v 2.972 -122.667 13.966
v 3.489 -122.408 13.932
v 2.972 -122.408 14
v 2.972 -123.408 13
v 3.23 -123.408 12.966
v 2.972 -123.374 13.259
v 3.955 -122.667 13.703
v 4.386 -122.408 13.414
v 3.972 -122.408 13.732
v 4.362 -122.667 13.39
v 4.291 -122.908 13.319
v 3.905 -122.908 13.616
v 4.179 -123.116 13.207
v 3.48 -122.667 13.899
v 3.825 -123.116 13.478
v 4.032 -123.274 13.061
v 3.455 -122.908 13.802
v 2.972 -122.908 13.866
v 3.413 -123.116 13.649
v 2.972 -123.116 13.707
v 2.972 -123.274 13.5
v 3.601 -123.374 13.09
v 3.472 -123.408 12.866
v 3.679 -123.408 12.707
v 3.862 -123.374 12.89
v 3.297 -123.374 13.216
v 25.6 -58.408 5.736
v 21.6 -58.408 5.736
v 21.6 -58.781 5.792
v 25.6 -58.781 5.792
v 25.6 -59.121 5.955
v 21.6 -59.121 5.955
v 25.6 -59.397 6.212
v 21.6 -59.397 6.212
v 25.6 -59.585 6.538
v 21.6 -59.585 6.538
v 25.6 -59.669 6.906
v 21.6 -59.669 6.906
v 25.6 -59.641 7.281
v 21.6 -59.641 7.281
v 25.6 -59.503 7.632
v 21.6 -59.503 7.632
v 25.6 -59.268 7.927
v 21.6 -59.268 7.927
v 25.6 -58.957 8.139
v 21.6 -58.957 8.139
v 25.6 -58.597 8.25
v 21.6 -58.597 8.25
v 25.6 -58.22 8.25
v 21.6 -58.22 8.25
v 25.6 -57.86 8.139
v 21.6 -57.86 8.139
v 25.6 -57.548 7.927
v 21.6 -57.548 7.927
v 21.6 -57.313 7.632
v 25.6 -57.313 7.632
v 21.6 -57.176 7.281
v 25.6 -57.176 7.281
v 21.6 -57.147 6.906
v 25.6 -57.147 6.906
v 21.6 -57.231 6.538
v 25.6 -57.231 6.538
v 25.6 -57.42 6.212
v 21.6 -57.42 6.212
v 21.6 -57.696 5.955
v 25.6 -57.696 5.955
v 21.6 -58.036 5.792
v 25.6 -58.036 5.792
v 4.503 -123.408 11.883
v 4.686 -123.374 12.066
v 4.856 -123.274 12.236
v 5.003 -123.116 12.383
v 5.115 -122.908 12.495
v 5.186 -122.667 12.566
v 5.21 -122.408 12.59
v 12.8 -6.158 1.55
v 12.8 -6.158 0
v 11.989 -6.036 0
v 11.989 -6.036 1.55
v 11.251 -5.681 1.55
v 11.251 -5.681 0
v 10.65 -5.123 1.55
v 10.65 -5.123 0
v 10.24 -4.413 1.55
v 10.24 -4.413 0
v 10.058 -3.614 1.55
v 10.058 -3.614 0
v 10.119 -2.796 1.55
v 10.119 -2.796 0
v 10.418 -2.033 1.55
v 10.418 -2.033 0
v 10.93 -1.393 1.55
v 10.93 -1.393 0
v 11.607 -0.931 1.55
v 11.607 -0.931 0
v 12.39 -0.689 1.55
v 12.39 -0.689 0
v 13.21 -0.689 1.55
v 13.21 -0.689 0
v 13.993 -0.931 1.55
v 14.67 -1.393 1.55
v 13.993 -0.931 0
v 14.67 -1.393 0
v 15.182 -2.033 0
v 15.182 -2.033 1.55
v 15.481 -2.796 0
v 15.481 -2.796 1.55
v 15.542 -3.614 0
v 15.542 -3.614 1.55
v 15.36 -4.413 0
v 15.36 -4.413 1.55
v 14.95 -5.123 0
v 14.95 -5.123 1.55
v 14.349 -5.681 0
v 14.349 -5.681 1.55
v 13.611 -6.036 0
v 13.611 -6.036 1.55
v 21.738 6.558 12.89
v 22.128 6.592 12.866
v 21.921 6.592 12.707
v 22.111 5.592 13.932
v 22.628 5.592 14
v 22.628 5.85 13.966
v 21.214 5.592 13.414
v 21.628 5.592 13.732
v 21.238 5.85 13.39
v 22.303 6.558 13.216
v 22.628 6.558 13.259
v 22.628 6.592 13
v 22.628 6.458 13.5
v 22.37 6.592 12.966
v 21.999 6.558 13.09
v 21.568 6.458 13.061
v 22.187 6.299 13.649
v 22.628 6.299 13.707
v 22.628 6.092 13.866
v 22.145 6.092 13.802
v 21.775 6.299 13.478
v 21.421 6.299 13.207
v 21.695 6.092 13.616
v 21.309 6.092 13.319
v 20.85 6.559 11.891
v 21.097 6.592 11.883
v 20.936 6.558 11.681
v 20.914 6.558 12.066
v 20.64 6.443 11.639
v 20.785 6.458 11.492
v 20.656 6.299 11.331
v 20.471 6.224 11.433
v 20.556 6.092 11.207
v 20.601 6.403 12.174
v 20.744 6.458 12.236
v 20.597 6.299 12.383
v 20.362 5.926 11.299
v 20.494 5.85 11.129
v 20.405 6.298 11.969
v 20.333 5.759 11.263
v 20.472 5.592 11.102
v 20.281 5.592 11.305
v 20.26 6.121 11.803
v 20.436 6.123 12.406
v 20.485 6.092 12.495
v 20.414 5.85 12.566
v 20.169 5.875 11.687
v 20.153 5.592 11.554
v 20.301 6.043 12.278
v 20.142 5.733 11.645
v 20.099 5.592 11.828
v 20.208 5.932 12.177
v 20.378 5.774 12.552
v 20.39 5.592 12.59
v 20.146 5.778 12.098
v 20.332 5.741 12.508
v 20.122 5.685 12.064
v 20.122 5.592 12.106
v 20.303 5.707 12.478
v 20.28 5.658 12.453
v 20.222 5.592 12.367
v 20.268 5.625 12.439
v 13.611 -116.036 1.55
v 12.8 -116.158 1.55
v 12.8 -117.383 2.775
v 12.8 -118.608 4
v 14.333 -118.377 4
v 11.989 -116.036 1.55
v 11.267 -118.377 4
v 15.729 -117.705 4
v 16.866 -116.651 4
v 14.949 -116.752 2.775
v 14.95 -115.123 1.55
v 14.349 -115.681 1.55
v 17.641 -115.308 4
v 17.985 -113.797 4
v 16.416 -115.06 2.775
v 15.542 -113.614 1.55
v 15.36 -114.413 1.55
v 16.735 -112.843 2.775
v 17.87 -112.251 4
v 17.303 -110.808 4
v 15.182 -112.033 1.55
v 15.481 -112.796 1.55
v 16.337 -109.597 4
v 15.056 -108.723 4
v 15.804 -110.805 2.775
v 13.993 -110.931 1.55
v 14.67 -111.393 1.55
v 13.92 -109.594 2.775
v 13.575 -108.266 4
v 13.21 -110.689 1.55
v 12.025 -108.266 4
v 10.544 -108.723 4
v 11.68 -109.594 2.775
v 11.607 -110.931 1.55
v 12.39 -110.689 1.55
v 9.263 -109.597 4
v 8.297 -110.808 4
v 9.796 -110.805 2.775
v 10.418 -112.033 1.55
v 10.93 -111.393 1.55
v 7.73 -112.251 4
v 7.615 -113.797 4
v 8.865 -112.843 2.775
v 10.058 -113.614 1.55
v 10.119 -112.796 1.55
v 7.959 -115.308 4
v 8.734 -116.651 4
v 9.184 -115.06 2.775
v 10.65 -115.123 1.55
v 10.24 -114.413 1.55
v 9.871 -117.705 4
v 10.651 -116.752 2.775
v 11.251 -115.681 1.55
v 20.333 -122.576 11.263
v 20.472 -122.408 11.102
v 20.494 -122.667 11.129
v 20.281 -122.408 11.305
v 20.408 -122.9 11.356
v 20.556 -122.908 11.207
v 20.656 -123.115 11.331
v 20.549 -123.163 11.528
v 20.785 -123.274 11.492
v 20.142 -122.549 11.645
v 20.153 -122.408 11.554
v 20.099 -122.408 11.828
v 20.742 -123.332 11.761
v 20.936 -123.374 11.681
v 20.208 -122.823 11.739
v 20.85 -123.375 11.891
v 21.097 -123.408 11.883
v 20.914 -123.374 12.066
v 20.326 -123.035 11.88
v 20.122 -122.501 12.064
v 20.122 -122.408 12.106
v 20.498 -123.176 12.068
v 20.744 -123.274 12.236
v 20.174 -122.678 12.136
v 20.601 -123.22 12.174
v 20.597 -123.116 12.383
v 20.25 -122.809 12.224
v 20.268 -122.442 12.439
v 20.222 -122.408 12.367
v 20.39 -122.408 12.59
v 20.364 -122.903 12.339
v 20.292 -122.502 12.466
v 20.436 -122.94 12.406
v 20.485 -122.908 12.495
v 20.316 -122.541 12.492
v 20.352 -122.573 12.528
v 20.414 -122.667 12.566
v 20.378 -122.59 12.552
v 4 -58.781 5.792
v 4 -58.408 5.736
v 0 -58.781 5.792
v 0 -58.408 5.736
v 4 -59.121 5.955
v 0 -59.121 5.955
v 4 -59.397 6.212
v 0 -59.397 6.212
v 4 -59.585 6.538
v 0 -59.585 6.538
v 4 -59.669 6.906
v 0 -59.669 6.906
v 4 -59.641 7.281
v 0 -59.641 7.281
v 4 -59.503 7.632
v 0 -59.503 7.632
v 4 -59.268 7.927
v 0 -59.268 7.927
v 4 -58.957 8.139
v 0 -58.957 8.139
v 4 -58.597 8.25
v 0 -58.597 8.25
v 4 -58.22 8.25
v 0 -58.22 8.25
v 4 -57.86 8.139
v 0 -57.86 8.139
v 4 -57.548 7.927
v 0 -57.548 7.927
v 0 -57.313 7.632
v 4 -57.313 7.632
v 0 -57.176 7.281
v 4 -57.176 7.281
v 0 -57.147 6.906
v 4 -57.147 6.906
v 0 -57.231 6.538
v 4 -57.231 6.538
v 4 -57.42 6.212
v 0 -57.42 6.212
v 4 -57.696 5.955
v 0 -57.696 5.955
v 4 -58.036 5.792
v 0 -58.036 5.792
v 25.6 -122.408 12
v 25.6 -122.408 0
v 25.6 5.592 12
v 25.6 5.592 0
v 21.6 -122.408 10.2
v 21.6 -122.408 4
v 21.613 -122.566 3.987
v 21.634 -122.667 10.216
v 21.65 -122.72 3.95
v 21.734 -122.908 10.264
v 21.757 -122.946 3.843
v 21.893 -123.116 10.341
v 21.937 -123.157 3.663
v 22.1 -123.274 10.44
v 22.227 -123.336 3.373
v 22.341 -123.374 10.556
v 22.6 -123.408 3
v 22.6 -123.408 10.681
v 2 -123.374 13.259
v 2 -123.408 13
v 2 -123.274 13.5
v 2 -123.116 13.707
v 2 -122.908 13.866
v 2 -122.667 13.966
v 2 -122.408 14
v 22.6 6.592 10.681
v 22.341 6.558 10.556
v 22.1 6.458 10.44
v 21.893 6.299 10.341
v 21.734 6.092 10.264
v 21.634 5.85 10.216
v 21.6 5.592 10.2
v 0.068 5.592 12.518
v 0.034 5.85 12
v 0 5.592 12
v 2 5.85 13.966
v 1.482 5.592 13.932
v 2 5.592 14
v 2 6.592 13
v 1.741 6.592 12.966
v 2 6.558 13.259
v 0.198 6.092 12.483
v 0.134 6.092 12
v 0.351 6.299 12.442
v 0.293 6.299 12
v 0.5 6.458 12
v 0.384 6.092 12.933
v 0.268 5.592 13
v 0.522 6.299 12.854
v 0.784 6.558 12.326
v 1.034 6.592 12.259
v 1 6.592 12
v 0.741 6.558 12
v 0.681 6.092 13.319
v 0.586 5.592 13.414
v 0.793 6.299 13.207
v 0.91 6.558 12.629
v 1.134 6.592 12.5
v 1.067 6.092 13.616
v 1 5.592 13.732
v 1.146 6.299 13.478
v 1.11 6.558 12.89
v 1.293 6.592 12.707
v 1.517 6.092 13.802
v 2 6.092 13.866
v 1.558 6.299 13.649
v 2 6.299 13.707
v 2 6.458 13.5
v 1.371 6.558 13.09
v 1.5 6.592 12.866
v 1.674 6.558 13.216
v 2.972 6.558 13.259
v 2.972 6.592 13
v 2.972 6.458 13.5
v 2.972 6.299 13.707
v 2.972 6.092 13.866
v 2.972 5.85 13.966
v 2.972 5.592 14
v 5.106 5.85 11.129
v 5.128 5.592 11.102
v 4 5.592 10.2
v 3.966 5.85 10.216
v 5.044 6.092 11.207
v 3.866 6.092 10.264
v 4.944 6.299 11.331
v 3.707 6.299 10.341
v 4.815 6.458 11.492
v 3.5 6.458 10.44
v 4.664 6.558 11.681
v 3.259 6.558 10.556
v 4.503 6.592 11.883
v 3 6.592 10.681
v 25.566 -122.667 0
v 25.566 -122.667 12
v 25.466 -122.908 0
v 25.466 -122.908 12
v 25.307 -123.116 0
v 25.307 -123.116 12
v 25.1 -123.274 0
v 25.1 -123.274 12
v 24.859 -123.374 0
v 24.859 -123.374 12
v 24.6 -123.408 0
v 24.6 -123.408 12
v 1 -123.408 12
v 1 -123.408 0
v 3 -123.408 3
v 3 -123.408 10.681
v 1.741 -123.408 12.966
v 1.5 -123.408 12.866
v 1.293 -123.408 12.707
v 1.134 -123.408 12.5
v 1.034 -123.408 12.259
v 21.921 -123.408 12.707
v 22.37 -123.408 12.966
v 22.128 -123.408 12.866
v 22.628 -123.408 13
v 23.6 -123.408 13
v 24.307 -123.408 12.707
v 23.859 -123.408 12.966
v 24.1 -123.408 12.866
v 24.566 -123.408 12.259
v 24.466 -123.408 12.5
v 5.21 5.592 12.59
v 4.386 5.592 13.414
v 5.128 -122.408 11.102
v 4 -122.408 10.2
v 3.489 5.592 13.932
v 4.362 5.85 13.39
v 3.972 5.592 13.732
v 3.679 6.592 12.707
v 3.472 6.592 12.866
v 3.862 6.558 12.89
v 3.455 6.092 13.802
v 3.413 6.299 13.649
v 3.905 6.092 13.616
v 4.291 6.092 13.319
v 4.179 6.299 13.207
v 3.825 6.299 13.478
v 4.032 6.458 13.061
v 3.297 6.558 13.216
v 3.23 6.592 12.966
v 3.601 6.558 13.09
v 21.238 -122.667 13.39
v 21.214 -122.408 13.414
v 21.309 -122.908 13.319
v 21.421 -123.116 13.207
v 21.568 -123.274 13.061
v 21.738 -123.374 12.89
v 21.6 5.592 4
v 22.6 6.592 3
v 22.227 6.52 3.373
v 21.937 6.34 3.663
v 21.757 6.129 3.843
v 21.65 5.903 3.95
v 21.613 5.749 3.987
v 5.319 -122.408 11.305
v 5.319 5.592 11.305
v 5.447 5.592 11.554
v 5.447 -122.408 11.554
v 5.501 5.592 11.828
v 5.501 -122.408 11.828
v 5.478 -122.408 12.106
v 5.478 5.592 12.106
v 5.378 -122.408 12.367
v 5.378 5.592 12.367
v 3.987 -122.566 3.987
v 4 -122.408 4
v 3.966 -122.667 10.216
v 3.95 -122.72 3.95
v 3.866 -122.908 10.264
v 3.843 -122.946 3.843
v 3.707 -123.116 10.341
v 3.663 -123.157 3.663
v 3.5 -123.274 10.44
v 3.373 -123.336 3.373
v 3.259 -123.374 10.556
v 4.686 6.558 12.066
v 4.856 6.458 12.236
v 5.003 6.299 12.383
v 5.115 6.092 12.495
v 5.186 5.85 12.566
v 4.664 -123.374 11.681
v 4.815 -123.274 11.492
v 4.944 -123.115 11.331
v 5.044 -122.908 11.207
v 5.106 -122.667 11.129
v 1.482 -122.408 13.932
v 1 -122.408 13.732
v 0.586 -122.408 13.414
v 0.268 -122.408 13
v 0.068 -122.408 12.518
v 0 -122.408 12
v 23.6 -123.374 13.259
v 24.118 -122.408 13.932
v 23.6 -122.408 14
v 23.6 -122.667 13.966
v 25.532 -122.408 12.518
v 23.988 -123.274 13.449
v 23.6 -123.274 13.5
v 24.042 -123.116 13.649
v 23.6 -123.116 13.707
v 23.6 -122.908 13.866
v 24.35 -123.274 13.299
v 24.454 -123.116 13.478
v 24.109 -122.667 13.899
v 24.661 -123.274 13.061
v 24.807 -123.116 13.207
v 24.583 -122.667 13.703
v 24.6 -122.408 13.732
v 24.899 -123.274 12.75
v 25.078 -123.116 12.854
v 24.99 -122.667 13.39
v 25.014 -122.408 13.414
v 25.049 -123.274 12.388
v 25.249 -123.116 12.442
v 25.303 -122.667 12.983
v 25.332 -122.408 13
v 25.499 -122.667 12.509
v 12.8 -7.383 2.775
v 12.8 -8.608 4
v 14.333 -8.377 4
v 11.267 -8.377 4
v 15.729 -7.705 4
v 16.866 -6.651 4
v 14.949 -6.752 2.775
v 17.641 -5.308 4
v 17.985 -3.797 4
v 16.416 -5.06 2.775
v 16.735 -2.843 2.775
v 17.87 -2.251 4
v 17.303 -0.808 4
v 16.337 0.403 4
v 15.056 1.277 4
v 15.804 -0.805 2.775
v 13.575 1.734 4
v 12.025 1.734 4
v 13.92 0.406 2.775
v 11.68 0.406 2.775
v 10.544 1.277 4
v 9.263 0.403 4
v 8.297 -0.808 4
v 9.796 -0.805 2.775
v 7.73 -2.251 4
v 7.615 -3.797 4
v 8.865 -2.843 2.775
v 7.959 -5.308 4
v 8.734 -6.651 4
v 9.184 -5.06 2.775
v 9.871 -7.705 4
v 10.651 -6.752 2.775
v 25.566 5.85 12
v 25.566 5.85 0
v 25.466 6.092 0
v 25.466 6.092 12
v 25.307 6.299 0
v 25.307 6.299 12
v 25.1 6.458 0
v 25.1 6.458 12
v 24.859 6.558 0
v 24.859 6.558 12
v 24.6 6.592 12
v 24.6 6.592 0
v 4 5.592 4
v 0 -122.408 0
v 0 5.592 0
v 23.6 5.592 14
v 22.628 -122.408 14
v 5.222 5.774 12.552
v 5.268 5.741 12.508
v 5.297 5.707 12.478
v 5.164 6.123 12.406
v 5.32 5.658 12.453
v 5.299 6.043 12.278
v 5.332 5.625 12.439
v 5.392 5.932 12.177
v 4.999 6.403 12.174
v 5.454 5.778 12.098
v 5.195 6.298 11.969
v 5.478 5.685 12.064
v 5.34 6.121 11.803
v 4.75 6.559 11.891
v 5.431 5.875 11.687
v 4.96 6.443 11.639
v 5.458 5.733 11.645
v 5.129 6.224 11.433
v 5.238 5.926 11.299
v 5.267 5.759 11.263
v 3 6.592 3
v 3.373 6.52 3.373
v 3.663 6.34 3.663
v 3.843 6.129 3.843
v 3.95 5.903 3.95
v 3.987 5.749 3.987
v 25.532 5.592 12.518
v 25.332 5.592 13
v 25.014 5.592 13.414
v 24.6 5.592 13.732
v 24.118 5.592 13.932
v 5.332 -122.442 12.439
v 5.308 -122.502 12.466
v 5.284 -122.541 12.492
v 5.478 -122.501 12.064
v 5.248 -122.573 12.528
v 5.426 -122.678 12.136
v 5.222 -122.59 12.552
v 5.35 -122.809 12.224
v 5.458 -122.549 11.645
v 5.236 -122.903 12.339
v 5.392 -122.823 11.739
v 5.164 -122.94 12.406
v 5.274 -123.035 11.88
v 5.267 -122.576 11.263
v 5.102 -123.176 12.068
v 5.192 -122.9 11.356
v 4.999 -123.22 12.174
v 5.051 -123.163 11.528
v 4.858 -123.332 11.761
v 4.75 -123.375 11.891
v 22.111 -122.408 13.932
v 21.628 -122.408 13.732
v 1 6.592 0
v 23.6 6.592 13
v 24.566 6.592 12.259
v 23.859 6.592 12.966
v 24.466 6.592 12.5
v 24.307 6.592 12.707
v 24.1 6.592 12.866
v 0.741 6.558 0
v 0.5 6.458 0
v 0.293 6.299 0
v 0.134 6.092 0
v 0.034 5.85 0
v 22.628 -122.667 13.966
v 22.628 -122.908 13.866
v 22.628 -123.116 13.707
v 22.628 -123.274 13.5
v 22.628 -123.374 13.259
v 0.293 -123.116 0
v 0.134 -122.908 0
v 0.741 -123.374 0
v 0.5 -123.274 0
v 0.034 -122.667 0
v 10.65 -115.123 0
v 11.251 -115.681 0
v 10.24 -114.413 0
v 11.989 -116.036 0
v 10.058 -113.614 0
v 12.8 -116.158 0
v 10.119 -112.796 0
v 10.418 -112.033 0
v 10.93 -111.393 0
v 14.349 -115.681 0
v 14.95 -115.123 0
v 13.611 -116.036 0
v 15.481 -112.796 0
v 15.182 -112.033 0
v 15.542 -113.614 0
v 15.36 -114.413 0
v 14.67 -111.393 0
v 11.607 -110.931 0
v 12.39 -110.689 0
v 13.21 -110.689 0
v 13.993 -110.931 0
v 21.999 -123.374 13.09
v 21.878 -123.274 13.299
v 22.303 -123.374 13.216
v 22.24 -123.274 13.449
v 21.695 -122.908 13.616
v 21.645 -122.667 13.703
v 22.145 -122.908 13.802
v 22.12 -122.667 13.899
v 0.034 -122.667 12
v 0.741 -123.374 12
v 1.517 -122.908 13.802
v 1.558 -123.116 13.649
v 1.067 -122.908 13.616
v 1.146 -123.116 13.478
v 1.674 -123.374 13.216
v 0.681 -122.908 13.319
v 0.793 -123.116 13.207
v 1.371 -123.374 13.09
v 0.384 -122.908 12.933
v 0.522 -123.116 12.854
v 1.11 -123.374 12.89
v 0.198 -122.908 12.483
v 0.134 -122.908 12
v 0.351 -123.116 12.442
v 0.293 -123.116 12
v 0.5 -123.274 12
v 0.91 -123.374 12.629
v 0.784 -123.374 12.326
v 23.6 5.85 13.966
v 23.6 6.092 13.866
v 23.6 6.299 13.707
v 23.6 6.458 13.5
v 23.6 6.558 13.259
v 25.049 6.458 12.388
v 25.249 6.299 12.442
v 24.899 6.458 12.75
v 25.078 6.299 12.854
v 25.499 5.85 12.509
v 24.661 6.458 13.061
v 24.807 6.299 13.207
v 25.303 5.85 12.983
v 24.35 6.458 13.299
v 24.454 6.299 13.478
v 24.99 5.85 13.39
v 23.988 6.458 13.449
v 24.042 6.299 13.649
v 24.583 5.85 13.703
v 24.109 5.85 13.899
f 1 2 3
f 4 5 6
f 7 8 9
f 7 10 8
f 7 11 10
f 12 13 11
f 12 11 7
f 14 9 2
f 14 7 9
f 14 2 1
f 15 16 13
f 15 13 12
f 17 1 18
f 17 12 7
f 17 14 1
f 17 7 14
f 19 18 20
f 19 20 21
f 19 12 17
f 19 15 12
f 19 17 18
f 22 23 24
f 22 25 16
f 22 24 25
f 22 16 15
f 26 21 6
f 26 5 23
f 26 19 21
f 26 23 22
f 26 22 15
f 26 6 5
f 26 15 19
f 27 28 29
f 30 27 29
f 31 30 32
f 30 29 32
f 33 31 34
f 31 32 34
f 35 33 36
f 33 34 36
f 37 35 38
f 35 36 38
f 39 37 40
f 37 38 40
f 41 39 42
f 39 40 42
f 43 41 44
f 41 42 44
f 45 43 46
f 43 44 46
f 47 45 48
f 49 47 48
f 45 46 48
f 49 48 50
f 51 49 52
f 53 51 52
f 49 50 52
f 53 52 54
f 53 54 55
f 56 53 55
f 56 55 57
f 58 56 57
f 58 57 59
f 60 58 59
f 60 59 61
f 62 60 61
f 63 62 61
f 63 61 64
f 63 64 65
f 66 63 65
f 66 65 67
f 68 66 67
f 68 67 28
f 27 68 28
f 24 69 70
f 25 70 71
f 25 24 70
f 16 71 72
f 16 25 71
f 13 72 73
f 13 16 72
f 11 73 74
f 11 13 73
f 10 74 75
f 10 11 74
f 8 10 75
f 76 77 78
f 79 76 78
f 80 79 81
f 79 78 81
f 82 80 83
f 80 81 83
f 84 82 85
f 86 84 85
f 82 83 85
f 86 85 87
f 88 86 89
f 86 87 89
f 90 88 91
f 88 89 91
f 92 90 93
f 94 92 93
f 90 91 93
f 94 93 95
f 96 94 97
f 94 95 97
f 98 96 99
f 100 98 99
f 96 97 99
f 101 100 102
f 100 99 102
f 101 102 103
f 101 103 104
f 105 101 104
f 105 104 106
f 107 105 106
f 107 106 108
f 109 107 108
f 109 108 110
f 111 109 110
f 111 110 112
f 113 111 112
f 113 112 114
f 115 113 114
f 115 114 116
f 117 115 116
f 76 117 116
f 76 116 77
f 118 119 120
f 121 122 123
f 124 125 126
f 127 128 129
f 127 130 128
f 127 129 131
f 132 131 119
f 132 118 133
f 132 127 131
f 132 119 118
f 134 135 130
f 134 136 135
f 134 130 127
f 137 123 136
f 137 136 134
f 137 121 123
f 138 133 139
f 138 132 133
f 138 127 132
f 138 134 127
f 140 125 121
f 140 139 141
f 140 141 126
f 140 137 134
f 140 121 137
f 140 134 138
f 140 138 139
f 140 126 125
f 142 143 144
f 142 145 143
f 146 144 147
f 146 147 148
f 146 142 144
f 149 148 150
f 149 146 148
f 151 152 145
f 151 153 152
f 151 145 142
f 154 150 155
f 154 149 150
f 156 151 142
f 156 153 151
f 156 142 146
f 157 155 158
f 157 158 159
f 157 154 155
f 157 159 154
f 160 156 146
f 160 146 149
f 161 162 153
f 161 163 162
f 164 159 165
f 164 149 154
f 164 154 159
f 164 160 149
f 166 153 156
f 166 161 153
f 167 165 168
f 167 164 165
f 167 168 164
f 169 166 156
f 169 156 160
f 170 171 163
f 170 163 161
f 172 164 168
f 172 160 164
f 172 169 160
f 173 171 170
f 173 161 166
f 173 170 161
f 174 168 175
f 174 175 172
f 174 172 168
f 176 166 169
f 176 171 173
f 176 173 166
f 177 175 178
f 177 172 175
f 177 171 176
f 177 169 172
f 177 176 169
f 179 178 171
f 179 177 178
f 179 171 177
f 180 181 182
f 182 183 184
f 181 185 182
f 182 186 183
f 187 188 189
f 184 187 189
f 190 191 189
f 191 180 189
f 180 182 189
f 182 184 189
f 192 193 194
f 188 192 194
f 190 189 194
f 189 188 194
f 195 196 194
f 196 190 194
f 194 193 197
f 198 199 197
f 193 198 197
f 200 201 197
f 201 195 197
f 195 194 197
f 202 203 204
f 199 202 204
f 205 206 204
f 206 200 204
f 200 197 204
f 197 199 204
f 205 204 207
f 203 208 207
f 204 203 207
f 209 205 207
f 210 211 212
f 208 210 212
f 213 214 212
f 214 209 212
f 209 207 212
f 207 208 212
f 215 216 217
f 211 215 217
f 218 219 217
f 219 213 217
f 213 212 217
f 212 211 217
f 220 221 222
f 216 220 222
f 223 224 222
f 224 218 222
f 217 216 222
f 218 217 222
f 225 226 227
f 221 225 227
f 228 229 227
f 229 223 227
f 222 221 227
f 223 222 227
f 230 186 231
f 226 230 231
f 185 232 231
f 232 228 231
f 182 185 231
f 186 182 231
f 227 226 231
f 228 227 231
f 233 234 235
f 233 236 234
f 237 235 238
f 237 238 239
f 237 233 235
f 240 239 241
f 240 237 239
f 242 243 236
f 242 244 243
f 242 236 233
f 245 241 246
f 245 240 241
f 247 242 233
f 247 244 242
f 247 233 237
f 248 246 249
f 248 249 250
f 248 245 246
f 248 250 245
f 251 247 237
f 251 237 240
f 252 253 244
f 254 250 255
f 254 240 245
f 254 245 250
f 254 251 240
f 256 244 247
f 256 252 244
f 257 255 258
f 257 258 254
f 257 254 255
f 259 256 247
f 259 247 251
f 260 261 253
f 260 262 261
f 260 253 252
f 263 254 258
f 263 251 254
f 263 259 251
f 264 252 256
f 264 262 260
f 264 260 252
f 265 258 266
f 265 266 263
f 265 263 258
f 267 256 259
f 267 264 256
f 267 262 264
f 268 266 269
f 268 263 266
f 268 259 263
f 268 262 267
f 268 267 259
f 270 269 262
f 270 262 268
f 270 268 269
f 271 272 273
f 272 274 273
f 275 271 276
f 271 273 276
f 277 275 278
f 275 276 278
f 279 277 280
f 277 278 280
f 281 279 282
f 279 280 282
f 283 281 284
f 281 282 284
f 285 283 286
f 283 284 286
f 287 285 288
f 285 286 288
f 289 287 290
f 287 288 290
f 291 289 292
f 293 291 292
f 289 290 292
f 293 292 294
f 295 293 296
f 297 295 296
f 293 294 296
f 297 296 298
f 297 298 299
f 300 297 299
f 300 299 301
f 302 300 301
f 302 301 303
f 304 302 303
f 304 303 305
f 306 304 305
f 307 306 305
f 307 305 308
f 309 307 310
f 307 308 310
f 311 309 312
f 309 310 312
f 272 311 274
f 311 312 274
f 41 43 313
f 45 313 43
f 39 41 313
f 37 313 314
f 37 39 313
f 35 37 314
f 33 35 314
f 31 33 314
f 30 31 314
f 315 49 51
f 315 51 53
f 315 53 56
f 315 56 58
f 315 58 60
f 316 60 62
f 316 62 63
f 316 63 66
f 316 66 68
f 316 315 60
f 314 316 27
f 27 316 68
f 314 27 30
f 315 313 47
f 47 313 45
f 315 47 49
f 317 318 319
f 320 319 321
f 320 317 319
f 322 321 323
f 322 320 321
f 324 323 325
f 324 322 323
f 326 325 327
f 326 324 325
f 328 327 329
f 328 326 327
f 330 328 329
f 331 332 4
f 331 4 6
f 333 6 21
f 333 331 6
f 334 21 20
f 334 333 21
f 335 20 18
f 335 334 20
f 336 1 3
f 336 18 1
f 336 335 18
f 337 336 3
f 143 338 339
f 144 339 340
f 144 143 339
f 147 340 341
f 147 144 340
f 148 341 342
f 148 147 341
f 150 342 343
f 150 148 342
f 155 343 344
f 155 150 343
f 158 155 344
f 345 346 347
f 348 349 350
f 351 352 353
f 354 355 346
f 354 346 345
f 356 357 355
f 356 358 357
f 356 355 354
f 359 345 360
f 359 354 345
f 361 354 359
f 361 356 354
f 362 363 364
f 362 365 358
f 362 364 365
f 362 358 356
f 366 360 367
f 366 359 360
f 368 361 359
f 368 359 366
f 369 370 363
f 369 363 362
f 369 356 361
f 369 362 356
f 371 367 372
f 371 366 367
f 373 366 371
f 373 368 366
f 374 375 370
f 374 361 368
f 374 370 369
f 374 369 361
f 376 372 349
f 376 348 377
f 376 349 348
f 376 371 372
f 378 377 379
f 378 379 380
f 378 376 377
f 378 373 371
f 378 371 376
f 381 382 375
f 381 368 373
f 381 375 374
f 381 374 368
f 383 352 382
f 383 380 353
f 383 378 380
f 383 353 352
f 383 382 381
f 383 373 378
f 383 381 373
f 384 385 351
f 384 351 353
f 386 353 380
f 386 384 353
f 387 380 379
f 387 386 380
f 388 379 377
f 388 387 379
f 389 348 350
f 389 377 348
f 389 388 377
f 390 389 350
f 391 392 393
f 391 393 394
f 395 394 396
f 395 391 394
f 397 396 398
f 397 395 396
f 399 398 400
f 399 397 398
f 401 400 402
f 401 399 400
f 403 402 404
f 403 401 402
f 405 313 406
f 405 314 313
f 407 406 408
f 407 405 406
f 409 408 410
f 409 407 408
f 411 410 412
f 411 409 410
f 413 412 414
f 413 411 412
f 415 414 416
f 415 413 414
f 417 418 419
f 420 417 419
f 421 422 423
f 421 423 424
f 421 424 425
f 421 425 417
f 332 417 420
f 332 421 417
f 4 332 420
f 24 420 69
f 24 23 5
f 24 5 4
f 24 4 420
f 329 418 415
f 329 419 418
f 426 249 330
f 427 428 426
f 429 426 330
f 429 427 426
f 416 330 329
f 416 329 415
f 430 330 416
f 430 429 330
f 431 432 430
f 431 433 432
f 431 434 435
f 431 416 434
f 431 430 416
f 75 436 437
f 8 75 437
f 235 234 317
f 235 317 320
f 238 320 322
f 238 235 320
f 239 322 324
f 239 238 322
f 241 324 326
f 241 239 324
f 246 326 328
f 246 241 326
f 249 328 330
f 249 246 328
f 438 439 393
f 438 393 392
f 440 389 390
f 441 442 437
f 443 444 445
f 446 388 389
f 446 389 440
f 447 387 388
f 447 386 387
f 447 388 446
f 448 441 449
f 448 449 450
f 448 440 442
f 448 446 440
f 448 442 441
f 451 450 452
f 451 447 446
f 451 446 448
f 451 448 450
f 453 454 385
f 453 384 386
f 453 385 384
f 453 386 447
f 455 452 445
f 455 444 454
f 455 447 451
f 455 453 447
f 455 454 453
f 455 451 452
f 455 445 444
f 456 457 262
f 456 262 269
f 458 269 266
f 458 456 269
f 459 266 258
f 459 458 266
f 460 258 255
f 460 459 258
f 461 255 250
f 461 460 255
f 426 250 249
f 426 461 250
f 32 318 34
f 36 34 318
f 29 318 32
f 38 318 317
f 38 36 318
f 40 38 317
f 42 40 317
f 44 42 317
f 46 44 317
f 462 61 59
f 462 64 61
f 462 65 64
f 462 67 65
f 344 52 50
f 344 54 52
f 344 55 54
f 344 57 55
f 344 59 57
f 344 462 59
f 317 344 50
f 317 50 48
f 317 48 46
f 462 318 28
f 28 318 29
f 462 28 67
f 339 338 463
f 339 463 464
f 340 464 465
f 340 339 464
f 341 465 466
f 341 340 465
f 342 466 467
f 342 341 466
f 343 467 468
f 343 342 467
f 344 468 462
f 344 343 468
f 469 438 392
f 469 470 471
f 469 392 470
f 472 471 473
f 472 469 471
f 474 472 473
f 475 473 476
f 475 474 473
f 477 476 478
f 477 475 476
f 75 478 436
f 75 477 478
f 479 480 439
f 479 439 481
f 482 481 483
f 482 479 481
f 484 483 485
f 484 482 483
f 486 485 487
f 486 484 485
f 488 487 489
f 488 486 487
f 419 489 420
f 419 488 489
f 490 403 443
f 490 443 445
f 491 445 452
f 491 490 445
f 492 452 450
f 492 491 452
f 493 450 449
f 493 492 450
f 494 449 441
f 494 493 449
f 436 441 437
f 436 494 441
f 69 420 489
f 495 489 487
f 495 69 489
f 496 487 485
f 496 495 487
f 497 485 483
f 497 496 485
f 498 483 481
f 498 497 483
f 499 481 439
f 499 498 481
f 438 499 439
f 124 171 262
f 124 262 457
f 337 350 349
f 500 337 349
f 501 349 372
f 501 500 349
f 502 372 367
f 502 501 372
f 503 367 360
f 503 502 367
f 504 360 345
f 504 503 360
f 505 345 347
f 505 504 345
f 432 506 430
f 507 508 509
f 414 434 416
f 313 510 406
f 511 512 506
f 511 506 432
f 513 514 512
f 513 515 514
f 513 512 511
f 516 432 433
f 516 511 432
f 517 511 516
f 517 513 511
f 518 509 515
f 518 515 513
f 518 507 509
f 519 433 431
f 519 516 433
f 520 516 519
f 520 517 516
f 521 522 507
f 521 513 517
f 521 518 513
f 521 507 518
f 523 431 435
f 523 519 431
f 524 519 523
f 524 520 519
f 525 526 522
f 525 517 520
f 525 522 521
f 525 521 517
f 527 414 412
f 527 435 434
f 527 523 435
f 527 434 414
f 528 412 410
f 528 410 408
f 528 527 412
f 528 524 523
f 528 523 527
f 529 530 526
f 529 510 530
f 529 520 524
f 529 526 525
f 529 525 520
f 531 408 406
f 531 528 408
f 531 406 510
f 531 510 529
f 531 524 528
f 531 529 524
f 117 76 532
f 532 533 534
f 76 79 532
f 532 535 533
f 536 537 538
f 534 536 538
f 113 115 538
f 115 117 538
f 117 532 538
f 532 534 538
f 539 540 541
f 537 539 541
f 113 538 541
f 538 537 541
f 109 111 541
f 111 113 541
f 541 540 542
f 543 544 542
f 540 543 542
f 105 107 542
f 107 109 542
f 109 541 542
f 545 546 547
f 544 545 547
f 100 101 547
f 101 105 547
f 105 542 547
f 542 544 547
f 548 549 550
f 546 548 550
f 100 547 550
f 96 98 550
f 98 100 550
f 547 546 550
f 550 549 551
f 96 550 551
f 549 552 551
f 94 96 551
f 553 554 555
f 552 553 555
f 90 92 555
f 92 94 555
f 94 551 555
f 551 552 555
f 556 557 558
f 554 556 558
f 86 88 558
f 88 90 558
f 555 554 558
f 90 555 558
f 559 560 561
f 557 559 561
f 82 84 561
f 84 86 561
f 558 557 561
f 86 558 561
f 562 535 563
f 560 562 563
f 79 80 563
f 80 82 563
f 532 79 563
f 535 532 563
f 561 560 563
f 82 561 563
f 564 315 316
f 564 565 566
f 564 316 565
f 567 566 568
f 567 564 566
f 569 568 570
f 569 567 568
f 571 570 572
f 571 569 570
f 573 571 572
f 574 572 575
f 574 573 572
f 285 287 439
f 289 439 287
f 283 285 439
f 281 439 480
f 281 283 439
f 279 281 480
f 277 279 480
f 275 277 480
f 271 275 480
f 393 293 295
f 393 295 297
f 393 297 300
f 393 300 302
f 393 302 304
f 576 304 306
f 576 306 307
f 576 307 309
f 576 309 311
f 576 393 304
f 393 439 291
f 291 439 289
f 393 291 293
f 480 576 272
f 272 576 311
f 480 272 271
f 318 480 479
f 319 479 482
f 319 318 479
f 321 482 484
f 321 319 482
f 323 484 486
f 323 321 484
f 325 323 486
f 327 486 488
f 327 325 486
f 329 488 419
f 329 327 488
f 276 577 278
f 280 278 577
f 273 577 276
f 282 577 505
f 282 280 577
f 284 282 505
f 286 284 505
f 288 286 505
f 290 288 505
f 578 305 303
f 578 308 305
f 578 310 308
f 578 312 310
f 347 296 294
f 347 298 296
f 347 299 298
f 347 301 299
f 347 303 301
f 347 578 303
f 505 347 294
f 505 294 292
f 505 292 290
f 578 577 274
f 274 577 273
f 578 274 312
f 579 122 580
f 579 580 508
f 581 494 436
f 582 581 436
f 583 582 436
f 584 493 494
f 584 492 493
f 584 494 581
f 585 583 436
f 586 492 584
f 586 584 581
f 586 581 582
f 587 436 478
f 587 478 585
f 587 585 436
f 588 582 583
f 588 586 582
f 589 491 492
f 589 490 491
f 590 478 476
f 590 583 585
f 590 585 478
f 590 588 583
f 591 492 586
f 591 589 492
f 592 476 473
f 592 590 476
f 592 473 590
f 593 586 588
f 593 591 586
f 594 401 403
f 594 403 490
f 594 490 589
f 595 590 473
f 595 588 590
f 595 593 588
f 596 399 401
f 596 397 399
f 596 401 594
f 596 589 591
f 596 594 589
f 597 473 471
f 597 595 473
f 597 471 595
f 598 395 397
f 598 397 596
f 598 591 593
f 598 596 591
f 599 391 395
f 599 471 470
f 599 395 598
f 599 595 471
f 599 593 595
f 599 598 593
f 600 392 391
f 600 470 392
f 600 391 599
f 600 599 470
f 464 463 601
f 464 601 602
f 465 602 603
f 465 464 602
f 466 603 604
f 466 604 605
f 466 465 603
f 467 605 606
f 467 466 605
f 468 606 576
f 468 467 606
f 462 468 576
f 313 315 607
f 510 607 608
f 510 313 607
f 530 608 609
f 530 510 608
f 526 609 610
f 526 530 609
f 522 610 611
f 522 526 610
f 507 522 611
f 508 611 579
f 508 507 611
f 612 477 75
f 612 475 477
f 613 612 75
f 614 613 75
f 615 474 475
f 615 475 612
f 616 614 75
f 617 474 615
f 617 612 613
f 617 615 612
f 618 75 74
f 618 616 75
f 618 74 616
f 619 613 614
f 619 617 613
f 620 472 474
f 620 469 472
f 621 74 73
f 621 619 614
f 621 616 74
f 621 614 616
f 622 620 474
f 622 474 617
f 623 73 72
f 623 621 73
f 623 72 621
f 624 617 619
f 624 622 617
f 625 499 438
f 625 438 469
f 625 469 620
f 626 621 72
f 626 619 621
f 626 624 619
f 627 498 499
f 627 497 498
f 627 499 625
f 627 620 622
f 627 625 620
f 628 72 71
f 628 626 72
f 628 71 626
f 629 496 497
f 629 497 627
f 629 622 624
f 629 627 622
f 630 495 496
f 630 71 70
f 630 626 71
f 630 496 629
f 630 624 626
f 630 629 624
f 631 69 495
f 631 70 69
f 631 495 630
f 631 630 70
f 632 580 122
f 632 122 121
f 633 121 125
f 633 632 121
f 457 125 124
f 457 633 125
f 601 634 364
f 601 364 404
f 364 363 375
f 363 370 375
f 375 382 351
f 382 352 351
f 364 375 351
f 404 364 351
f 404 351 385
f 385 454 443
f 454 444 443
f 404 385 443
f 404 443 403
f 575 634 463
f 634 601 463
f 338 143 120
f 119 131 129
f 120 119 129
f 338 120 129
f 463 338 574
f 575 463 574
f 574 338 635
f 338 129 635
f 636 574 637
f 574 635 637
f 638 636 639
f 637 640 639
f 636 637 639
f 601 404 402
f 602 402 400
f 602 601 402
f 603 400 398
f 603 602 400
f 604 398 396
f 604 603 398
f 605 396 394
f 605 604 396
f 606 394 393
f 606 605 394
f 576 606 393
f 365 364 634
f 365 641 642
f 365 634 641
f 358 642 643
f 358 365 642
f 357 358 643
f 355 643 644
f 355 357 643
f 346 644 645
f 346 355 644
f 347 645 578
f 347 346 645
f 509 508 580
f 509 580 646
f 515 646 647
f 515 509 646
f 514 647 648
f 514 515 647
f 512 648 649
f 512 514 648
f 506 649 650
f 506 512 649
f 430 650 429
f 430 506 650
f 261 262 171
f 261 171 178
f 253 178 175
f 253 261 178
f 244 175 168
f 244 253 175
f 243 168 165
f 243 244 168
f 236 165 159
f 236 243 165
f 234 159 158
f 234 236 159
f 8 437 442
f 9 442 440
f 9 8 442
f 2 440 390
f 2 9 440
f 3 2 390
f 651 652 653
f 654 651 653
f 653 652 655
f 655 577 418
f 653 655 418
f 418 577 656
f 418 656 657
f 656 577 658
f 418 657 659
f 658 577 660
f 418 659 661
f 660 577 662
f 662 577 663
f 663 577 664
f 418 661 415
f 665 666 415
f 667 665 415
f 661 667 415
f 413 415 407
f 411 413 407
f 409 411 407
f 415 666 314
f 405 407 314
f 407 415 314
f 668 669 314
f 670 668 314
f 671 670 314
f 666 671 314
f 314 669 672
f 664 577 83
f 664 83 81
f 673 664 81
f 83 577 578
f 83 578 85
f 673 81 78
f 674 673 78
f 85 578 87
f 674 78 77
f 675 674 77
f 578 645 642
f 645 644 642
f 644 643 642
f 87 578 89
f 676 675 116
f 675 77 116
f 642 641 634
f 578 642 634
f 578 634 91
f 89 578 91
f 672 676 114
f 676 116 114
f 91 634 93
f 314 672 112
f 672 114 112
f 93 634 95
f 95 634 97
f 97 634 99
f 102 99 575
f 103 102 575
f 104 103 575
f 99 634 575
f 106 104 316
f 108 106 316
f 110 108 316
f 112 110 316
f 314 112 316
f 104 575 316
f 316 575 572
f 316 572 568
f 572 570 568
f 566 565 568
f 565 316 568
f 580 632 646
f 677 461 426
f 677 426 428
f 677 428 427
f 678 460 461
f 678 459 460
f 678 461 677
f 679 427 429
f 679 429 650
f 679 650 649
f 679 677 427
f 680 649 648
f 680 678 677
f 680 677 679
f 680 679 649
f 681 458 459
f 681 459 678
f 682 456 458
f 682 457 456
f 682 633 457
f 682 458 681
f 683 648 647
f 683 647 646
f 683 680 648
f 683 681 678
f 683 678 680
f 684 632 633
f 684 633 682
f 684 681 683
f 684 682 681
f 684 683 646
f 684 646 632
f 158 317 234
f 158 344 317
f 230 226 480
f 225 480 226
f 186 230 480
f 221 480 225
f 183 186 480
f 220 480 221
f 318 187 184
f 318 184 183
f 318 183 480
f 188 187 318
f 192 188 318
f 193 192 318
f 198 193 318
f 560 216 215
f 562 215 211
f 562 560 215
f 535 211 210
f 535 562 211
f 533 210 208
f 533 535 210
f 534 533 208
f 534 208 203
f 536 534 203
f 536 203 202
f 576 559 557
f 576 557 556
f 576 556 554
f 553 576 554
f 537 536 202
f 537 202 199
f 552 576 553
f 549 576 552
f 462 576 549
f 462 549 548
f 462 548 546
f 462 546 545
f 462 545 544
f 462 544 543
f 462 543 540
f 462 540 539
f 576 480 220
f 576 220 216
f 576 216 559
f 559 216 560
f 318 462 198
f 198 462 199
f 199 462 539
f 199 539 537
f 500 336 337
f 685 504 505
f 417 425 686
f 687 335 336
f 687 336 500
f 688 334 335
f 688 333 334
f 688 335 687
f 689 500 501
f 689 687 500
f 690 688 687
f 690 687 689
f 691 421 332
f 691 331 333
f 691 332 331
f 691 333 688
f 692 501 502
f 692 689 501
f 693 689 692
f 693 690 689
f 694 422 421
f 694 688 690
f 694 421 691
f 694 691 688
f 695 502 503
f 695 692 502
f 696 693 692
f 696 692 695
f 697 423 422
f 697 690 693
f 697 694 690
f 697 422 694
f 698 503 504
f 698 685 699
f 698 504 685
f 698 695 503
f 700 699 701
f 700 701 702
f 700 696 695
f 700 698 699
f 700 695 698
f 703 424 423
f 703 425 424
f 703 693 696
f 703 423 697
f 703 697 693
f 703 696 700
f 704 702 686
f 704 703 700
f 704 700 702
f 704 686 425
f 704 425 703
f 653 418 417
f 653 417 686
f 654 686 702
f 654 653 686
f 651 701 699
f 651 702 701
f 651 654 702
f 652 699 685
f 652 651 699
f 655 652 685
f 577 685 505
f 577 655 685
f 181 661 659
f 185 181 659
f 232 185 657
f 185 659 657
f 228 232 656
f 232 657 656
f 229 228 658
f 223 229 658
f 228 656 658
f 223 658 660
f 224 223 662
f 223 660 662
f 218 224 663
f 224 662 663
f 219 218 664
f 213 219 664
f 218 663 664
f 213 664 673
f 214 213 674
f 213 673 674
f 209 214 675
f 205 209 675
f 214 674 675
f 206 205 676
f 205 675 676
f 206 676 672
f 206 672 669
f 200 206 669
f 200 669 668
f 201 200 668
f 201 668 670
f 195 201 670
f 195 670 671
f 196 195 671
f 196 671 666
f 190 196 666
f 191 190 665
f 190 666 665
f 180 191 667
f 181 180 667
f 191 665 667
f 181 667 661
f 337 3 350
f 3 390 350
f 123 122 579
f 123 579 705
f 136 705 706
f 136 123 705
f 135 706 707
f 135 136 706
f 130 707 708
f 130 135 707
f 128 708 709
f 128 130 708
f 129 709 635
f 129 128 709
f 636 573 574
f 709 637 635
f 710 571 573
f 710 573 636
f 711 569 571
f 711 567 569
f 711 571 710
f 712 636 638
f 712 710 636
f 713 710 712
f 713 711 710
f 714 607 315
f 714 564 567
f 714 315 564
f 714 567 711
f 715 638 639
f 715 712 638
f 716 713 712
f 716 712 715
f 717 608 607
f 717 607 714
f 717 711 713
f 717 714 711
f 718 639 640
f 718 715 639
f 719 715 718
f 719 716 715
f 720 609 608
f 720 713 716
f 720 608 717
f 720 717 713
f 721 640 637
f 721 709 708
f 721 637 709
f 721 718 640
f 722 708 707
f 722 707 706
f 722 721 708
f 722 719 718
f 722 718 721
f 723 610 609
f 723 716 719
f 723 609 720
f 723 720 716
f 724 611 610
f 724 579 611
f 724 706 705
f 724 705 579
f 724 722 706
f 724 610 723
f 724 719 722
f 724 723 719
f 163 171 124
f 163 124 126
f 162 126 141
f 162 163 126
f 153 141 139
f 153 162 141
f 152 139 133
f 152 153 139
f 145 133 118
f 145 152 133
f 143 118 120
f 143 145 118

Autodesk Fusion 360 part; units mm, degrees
sketch "profile" plane through (0, 0, 0) normal (0, 0, 1) x (1, 0, 0)
  line L0 (0, 0) -> (0, 14)
  line L1 (21.6, 10.2) -> (19.6, 11.8)
  line L2 (19.6, 11.8) -> (21.8, 14)
  line L3 (21.8, 14) -> (25.6, 14)
  line L4 (4, 10.2) -> (6, 11.8)
  line L5 (6, 11.8) -> (3.8, 14)
  line L6 (3.8, 14) -> (0, 14)
  line L7 (4, 4) -> (21.6, 4)
  line L8 (4, 10.2) -> (4, 4)
  line L9 (21.6, 4) -> (21.6, 10.2)
  line L10 (0, 0) -> (25.6, 0)
  line L11 (25.6, 14) -> (25.6, 0)
  dimension "d74" = 3.8
  dimension "d75" = 3.8
  dimension "d76" = 4
  dimension "d80" = 17.6
  dimension "d84" = 4
  dimension "d85" = 14
  dimension "d86" = 14
  dimension "d87" = 3.8
  dimension "d88" = 6
  dimension "d89" = 4
  dimension "d90" = 25.8
  dimension "d117" = 6
  dimension "d118" = 3.8
  dimension "d119" = 1.6
  dimension "d120" = 1.6
extrude "Extrude2" add sketch "profile" along normal blind 130
move_body "Move1" bodies 1 to x (1, 0, 0) y (0, 0, 1) z (0, -1, 0) at (0, 6.5916, 6.5916)
hole "Hole4" at (25.6, -58.4084, 13.5916) direction (-1, 0, 0) diameter 2.529 depth 42 tip angle 180
fillet "Fillet5" radius 2 1 edges at (25.6, -58.4084, 20.5916)
fillet "Fillet6" radius 2 1 edges at (0, -58.4084, 20.5916)
fillet "Fillet7" radius 2 2 edges at (21.8, -58.4084, 20.5916) (3.8, -58.4084, 20.5916)
fillet "Fillet8" radius 1 5 edges at (12.8, 6.5916, 10.5916) (21.6, 6.5916, 13.6916) (20.6, 6.5916, 17.5916) (5, 6.5916, 17.5916) (4, 6.5916, 13.6916)
fillet "Fillet9" radius 1 5 edges at (4, -123.4084, 13.6916) (21.6, -123.4084, 13.6916) (12.8, -123.4084, 10.5916) (5, -123.4084, 17.5916) (20.6, -123.4084, 17.5916)
move_body "Align2" bodies 1 to x (1, 0, 0) y (0, 1, 0) z (0, 0, 1) at (0, 0, -6.5916)
fillet "Fillet10" radius 1 26 edges at (25.6, -123.4084, 6) (25.0142, -123.4084, 13.4142) (23.1142, -123.4084, 14) (21.8631, -123.4084, 13.8478) (20.7628, -123.4084, 12.9628) (19.8084, -123.1155, 12.0084) (19.6, -58.4084, 11.8) (19.8084, 6.2987, 12.0084) (20.7628, 6.5916, 12.9628) (21.8631, 6.5916, 13.8478) (23.1142, 6.5916, 14) (25.0142, 6.5916, 13.4142) (25.6, 6.5916, 6) (0, 6.5916, 6) (0.5858, 6.5916, 13.4142) (2.4858, 6.5916, 14) (3.7369, 6.5916, 13.8478) (4.8372, 6.5916, 12.9628) (5.7916, 6.2987, 12.0084) (6, -58.4084, 11.8) (5.7916, -123.1155, 12.0084) (4.8372, -123.4084, 12.9628) (3.7369, -123.4084, 13.8478) (2.4858, -123.4084, 14) (0.5858, -123.4084, 13.4142) (0, -123.4084, 6)
hole "Hole5" at (12.8, -113.4084, 4) direction (0, 0, -1) diameter 5.5 depth 4 tip angle 180 countersink diameter 10.4 countersink angle 90
hole "Hole6" at (12.8, -3.4084, 4) direction (0, 0, -1) diameter 5.5 depth 15 tip angle 180 countersink diameter 10.4 countersink angle 90
equation "insideheight = 10 mm"
equation "d85 = height"
equation "d86 = height"
equation "height = 14 mm"
